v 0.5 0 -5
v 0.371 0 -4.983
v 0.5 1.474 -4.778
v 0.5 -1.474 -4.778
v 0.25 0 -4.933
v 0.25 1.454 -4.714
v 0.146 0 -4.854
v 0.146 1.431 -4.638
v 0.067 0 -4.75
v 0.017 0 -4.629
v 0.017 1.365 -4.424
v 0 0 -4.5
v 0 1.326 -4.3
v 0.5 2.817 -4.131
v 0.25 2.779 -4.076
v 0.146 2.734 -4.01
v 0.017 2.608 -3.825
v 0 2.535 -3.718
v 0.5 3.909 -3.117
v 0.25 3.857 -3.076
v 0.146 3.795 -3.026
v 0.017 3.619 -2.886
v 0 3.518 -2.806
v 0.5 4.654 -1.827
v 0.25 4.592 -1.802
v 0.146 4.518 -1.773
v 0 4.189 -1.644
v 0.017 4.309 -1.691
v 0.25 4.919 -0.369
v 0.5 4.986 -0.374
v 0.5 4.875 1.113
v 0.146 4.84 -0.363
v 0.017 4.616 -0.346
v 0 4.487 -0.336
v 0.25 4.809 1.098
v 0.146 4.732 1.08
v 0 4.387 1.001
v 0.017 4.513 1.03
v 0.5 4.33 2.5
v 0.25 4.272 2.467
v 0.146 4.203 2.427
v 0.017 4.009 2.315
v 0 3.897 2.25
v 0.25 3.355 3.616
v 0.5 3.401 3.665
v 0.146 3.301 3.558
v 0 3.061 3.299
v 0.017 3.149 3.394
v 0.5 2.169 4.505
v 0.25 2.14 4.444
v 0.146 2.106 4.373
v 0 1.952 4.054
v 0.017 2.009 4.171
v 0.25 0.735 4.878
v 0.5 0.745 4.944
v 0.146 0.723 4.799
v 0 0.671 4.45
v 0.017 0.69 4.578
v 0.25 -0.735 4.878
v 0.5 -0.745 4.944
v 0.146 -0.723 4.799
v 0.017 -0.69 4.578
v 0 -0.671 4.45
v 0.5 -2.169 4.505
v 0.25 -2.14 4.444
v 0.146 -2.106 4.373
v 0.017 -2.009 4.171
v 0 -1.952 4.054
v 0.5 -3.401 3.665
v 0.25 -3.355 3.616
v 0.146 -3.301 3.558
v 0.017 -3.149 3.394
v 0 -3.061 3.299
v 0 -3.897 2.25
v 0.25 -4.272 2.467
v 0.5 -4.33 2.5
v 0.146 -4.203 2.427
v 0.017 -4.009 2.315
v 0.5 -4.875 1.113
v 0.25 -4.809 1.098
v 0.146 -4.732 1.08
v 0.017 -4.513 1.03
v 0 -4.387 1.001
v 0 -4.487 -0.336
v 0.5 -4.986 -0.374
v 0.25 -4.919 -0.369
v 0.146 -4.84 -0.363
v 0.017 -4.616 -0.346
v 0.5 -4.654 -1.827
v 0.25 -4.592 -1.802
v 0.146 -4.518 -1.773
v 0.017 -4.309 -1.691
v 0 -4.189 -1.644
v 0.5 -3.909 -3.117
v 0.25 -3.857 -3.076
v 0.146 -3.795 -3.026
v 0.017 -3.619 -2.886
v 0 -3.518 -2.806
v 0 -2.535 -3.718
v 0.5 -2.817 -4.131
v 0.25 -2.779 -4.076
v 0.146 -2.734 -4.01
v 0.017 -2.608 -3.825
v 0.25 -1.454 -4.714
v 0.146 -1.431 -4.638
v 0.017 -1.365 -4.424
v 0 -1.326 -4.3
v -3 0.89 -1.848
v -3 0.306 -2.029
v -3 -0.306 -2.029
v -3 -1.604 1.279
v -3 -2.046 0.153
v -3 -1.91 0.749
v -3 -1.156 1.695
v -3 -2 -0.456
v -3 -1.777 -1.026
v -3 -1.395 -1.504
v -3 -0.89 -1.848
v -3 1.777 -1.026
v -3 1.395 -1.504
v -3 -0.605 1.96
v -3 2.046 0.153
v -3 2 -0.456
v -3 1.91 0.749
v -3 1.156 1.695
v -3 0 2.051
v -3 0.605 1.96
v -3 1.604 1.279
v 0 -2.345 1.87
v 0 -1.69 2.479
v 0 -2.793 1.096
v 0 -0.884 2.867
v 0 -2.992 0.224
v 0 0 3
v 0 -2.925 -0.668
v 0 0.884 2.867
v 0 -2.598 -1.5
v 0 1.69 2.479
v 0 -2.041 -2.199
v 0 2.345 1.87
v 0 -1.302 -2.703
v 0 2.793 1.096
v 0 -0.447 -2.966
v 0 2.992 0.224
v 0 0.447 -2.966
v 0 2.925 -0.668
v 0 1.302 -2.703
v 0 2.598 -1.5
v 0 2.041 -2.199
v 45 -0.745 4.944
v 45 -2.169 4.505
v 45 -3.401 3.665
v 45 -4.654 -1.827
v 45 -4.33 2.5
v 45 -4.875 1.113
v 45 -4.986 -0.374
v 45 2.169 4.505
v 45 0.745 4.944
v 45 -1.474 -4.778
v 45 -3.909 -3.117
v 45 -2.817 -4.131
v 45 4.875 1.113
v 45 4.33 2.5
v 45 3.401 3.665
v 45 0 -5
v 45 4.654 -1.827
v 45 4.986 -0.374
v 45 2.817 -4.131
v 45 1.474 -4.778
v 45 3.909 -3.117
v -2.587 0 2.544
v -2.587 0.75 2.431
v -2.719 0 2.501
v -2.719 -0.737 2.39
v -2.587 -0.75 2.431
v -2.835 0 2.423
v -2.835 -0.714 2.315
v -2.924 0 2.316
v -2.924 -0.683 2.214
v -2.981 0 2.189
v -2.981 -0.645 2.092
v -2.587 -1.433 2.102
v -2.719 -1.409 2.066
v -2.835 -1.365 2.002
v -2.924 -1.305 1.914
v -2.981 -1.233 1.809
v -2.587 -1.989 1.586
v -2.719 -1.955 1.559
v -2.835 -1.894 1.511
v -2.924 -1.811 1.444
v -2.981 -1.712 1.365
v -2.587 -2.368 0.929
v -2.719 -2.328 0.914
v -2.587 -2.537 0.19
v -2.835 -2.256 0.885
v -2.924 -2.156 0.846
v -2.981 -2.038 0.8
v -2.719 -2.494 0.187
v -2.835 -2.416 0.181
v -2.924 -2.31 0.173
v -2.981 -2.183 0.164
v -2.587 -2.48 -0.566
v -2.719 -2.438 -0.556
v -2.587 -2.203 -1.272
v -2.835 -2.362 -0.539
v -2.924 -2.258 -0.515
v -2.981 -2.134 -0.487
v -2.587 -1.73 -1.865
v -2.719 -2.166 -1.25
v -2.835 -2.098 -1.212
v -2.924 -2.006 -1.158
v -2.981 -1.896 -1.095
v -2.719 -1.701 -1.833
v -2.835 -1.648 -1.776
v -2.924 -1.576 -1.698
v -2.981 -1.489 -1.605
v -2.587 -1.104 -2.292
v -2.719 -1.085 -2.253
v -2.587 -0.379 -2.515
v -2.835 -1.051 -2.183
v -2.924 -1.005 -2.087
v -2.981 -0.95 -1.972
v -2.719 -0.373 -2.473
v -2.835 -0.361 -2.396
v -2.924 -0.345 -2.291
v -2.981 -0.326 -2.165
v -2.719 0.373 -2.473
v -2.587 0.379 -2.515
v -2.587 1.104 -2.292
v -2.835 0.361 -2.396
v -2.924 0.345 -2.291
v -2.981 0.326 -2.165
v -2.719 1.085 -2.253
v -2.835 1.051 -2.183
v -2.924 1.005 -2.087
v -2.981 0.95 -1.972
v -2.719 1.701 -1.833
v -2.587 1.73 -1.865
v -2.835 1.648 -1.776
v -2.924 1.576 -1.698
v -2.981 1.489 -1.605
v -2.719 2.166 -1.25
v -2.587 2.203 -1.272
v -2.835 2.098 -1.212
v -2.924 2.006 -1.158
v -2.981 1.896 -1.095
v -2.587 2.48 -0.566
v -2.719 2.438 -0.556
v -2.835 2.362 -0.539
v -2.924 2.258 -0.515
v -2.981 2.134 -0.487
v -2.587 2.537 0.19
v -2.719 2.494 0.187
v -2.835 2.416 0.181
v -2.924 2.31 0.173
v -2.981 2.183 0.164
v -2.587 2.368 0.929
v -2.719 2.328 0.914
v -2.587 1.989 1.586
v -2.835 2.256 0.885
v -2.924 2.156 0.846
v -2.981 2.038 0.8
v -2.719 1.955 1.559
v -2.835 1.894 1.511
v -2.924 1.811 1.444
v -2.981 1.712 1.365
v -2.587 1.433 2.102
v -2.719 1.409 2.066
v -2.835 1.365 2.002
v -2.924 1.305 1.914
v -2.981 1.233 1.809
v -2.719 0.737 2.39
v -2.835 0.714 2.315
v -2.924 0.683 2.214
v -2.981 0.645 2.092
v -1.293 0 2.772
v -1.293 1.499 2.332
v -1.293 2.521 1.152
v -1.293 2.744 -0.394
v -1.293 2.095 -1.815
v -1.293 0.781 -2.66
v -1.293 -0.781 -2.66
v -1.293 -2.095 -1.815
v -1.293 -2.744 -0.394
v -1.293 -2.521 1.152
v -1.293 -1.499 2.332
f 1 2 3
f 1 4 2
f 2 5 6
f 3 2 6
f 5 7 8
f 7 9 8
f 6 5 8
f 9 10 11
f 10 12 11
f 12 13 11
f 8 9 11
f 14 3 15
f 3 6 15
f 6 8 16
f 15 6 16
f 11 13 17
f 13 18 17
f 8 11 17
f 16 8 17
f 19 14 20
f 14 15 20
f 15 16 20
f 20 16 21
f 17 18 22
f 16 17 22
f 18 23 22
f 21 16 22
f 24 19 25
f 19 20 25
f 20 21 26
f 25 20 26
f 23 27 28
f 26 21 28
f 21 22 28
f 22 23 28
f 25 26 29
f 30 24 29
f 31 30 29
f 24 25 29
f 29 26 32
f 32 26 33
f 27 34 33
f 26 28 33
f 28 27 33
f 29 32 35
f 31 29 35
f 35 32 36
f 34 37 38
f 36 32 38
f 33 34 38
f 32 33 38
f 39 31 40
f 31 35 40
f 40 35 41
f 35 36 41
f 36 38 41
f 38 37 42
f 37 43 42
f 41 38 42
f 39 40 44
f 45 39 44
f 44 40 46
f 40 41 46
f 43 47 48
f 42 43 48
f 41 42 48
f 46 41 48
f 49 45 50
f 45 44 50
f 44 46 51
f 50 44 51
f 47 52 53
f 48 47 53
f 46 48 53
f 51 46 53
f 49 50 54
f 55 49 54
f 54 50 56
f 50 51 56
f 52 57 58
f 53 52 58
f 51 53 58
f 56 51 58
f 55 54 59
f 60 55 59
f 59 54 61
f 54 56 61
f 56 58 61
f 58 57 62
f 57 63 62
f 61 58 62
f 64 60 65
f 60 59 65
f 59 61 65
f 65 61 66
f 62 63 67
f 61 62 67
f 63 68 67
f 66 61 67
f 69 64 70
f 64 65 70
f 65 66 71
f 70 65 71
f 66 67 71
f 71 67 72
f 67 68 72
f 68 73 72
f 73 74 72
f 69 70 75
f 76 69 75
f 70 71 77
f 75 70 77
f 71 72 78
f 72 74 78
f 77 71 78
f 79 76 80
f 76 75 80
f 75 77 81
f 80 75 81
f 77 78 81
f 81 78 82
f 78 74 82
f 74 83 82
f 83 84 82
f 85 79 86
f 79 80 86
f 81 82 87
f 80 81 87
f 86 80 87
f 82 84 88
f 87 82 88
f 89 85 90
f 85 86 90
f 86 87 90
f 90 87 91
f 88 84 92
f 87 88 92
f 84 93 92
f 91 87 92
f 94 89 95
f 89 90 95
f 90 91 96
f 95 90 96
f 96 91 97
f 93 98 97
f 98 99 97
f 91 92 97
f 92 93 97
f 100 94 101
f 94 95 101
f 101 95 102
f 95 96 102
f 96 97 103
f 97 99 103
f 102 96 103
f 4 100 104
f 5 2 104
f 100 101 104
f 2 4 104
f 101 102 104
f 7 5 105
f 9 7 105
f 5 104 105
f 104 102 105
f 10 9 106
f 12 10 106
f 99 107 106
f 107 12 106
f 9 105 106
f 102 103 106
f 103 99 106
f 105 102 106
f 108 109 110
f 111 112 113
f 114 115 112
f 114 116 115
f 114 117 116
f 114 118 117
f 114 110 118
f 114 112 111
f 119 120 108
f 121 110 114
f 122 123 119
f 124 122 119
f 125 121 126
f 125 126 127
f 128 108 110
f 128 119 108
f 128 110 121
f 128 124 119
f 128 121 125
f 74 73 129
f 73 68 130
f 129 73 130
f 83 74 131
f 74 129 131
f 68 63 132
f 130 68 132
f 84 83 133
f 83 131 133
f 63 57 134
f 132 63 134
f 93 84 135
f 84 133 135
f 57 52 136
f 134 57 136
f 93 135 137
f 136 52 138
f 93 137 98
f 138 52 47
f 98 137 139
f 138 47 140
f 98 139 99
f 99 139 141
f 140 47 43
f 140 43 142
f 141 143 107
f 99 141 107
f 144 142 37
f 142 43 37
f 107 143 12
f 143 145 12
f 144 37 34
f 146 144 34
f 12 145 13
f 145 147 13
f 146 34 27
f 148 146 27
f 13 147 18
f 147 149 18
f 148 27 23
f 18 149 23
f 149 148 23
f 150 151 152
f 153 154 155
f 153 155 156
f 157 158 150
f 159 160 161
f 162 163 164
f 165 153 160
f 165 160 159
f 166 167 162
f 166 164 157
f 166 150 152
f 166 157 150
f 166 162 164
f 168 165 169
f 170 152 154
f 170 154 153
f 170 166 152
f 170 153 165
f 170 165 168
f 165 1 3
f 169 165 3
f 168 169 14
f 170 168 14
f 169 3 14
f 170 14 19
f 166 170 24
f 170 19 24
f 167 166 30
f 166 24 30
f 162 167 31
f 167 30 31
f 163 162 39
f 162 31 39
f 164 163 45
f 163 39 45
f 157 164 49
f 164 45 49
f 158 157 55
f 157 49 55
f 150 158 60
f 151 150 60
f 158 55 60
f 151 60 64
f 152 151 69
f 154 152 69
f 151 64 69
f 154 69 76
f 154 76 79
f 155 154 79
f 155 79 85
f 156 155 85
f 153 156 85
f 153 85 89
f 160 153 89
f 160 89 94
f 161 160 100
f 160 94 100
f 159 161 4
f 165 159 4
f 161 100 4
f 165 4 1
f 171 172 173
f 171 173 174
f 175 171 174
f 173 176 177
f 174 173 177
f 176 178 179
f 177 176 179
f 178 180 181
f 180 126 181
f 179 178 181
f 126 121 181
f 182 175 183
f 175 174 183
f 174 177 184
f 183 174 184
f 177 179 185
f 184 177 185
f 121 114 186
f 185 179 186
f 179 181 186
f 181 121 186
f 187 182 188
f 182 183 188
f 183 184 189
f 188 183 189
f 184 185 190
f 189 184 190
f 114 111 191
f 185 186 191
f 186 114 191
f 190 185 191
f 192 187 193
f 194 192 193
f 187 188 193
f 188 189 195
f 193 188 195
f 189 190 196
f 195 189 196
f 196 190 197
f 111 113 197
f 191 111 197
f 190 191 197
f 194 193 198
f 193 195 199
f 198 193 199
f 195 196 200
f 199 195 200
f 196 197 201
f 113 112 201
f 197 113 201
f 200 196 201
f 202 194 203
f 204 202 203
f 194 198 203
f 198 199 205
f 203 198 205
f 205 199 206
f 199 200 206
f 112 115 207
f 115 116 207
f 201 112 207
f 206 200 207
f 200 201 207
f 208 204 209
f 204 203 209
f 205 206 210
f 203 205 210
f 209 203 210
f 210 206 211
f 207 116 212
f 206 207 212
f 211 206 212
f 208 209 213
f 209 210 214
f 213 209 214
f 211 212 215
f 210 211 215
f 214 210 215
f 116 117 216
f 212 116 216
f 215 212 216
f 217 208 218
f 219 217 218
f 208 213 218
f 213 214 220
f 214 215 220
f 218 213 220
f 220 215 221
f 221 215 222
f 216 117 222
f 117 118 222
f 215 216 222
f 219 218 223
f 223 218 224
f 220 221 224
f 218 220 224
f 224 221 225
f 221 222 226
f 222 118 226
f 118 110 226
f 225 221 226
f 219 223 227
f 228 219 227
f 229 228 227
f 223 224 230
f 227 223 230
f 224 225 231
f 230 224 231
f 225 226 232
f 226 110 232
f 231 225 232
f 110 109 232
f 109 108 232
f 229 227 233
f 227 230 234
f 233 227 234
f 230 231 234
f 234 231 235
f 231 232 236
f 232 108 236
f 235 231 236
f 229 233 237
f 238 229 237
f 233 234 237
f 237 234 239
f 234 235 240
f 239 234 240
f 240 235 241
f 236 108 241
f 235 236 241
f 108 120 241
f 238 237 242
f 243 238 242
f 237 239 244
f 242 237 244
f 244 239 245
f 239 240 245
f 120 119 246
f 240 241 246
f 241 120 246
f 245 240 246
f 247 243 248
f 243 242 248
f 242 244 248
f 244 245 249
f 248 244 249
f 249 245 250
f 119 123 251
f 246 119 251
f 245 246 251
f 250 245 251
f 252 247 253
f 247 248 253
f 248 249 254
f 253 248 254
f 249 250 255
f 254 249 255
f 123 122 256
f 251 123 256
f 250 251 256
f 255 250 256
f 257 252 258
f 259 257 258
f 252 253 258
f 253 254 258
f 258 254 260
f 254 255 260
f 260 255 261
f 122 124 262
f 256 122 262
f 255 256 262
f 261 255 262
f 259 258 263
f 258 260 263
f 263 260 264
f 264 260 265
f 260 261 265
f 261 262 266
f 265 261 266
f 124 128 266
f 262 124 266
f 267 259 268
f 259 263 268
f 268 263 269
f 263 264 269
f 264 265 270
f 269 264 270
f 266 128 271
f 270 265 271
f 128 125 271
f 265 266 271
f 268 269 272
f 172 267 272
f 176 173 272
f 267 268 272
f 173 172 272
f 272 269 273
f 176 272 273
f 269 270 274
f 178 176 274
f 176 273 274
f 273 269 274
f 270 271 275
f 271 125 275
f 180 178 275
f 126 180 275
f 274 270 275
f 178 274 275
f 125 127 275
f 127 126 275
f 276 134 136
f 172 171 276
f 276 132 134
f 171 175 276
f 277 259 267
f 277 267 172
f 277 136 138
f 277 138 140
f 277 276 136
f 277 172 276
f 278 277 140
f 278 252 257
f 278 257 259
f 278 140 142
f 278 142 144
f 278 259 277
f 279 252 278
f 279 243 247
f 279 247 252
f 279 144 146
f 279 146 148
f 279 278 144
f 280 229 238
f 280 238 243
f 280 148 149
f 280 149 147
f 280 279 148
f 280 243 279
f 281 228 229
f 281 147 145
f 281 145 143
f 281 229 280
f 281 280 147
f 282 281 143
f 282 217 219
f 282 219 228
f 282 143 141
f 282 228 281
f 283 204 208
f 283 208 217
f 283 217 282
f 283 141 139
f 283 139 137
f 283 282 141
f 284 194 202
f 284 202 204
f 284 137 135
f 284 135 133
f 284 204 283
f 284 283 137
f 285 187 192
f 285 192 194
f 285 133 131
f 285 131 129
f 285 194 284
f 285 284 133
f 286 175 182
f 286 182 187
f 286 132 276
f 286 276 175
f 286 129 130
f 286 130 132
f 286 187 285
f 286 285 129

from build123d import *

# Parameters (mm, degrees)
SKETCH1_R           = 5
BOSS_EXTRUDE1_DEPTH = 45
SKETCH2_R           = 3
BOSS_EXTRUDE2_DEPTH = 3
BOSS_EXTRUDE2_TAPER = 10
FILLET1_R           = 0.5


with BuildPart() as part:
    # Sketch1 → Boss-Extrude1 (new body)
    with BuildSketch(Plane(origin=(0, 0, 0), x_dir=(0, 0, -1), z_dir=(1, 0, 0))):
        Circle(SKETCH1_R)
    extrude(amount=BOSS_EXTRUDE1_DEPTH)

    # Sketch2 → Boss-Extrude2 (add)
    with BuildSketch(Plane.ZY):
        Circle(SKETCH2_R)
    extrude(amount=BOSS_EXTRUDE2_DEPTH, taper=BOSS_EXTRUDE2_TAPER)

    # Fillet1
    fillet1_edges = [part.edges().sort_by_distance(p)[0] for p in [
        (0, 0, 5),
        (-3, 0, -2.471019058),
    ]]
    fillet(fillet1_edges, radius=FILLET1_R)


solid = part.part
